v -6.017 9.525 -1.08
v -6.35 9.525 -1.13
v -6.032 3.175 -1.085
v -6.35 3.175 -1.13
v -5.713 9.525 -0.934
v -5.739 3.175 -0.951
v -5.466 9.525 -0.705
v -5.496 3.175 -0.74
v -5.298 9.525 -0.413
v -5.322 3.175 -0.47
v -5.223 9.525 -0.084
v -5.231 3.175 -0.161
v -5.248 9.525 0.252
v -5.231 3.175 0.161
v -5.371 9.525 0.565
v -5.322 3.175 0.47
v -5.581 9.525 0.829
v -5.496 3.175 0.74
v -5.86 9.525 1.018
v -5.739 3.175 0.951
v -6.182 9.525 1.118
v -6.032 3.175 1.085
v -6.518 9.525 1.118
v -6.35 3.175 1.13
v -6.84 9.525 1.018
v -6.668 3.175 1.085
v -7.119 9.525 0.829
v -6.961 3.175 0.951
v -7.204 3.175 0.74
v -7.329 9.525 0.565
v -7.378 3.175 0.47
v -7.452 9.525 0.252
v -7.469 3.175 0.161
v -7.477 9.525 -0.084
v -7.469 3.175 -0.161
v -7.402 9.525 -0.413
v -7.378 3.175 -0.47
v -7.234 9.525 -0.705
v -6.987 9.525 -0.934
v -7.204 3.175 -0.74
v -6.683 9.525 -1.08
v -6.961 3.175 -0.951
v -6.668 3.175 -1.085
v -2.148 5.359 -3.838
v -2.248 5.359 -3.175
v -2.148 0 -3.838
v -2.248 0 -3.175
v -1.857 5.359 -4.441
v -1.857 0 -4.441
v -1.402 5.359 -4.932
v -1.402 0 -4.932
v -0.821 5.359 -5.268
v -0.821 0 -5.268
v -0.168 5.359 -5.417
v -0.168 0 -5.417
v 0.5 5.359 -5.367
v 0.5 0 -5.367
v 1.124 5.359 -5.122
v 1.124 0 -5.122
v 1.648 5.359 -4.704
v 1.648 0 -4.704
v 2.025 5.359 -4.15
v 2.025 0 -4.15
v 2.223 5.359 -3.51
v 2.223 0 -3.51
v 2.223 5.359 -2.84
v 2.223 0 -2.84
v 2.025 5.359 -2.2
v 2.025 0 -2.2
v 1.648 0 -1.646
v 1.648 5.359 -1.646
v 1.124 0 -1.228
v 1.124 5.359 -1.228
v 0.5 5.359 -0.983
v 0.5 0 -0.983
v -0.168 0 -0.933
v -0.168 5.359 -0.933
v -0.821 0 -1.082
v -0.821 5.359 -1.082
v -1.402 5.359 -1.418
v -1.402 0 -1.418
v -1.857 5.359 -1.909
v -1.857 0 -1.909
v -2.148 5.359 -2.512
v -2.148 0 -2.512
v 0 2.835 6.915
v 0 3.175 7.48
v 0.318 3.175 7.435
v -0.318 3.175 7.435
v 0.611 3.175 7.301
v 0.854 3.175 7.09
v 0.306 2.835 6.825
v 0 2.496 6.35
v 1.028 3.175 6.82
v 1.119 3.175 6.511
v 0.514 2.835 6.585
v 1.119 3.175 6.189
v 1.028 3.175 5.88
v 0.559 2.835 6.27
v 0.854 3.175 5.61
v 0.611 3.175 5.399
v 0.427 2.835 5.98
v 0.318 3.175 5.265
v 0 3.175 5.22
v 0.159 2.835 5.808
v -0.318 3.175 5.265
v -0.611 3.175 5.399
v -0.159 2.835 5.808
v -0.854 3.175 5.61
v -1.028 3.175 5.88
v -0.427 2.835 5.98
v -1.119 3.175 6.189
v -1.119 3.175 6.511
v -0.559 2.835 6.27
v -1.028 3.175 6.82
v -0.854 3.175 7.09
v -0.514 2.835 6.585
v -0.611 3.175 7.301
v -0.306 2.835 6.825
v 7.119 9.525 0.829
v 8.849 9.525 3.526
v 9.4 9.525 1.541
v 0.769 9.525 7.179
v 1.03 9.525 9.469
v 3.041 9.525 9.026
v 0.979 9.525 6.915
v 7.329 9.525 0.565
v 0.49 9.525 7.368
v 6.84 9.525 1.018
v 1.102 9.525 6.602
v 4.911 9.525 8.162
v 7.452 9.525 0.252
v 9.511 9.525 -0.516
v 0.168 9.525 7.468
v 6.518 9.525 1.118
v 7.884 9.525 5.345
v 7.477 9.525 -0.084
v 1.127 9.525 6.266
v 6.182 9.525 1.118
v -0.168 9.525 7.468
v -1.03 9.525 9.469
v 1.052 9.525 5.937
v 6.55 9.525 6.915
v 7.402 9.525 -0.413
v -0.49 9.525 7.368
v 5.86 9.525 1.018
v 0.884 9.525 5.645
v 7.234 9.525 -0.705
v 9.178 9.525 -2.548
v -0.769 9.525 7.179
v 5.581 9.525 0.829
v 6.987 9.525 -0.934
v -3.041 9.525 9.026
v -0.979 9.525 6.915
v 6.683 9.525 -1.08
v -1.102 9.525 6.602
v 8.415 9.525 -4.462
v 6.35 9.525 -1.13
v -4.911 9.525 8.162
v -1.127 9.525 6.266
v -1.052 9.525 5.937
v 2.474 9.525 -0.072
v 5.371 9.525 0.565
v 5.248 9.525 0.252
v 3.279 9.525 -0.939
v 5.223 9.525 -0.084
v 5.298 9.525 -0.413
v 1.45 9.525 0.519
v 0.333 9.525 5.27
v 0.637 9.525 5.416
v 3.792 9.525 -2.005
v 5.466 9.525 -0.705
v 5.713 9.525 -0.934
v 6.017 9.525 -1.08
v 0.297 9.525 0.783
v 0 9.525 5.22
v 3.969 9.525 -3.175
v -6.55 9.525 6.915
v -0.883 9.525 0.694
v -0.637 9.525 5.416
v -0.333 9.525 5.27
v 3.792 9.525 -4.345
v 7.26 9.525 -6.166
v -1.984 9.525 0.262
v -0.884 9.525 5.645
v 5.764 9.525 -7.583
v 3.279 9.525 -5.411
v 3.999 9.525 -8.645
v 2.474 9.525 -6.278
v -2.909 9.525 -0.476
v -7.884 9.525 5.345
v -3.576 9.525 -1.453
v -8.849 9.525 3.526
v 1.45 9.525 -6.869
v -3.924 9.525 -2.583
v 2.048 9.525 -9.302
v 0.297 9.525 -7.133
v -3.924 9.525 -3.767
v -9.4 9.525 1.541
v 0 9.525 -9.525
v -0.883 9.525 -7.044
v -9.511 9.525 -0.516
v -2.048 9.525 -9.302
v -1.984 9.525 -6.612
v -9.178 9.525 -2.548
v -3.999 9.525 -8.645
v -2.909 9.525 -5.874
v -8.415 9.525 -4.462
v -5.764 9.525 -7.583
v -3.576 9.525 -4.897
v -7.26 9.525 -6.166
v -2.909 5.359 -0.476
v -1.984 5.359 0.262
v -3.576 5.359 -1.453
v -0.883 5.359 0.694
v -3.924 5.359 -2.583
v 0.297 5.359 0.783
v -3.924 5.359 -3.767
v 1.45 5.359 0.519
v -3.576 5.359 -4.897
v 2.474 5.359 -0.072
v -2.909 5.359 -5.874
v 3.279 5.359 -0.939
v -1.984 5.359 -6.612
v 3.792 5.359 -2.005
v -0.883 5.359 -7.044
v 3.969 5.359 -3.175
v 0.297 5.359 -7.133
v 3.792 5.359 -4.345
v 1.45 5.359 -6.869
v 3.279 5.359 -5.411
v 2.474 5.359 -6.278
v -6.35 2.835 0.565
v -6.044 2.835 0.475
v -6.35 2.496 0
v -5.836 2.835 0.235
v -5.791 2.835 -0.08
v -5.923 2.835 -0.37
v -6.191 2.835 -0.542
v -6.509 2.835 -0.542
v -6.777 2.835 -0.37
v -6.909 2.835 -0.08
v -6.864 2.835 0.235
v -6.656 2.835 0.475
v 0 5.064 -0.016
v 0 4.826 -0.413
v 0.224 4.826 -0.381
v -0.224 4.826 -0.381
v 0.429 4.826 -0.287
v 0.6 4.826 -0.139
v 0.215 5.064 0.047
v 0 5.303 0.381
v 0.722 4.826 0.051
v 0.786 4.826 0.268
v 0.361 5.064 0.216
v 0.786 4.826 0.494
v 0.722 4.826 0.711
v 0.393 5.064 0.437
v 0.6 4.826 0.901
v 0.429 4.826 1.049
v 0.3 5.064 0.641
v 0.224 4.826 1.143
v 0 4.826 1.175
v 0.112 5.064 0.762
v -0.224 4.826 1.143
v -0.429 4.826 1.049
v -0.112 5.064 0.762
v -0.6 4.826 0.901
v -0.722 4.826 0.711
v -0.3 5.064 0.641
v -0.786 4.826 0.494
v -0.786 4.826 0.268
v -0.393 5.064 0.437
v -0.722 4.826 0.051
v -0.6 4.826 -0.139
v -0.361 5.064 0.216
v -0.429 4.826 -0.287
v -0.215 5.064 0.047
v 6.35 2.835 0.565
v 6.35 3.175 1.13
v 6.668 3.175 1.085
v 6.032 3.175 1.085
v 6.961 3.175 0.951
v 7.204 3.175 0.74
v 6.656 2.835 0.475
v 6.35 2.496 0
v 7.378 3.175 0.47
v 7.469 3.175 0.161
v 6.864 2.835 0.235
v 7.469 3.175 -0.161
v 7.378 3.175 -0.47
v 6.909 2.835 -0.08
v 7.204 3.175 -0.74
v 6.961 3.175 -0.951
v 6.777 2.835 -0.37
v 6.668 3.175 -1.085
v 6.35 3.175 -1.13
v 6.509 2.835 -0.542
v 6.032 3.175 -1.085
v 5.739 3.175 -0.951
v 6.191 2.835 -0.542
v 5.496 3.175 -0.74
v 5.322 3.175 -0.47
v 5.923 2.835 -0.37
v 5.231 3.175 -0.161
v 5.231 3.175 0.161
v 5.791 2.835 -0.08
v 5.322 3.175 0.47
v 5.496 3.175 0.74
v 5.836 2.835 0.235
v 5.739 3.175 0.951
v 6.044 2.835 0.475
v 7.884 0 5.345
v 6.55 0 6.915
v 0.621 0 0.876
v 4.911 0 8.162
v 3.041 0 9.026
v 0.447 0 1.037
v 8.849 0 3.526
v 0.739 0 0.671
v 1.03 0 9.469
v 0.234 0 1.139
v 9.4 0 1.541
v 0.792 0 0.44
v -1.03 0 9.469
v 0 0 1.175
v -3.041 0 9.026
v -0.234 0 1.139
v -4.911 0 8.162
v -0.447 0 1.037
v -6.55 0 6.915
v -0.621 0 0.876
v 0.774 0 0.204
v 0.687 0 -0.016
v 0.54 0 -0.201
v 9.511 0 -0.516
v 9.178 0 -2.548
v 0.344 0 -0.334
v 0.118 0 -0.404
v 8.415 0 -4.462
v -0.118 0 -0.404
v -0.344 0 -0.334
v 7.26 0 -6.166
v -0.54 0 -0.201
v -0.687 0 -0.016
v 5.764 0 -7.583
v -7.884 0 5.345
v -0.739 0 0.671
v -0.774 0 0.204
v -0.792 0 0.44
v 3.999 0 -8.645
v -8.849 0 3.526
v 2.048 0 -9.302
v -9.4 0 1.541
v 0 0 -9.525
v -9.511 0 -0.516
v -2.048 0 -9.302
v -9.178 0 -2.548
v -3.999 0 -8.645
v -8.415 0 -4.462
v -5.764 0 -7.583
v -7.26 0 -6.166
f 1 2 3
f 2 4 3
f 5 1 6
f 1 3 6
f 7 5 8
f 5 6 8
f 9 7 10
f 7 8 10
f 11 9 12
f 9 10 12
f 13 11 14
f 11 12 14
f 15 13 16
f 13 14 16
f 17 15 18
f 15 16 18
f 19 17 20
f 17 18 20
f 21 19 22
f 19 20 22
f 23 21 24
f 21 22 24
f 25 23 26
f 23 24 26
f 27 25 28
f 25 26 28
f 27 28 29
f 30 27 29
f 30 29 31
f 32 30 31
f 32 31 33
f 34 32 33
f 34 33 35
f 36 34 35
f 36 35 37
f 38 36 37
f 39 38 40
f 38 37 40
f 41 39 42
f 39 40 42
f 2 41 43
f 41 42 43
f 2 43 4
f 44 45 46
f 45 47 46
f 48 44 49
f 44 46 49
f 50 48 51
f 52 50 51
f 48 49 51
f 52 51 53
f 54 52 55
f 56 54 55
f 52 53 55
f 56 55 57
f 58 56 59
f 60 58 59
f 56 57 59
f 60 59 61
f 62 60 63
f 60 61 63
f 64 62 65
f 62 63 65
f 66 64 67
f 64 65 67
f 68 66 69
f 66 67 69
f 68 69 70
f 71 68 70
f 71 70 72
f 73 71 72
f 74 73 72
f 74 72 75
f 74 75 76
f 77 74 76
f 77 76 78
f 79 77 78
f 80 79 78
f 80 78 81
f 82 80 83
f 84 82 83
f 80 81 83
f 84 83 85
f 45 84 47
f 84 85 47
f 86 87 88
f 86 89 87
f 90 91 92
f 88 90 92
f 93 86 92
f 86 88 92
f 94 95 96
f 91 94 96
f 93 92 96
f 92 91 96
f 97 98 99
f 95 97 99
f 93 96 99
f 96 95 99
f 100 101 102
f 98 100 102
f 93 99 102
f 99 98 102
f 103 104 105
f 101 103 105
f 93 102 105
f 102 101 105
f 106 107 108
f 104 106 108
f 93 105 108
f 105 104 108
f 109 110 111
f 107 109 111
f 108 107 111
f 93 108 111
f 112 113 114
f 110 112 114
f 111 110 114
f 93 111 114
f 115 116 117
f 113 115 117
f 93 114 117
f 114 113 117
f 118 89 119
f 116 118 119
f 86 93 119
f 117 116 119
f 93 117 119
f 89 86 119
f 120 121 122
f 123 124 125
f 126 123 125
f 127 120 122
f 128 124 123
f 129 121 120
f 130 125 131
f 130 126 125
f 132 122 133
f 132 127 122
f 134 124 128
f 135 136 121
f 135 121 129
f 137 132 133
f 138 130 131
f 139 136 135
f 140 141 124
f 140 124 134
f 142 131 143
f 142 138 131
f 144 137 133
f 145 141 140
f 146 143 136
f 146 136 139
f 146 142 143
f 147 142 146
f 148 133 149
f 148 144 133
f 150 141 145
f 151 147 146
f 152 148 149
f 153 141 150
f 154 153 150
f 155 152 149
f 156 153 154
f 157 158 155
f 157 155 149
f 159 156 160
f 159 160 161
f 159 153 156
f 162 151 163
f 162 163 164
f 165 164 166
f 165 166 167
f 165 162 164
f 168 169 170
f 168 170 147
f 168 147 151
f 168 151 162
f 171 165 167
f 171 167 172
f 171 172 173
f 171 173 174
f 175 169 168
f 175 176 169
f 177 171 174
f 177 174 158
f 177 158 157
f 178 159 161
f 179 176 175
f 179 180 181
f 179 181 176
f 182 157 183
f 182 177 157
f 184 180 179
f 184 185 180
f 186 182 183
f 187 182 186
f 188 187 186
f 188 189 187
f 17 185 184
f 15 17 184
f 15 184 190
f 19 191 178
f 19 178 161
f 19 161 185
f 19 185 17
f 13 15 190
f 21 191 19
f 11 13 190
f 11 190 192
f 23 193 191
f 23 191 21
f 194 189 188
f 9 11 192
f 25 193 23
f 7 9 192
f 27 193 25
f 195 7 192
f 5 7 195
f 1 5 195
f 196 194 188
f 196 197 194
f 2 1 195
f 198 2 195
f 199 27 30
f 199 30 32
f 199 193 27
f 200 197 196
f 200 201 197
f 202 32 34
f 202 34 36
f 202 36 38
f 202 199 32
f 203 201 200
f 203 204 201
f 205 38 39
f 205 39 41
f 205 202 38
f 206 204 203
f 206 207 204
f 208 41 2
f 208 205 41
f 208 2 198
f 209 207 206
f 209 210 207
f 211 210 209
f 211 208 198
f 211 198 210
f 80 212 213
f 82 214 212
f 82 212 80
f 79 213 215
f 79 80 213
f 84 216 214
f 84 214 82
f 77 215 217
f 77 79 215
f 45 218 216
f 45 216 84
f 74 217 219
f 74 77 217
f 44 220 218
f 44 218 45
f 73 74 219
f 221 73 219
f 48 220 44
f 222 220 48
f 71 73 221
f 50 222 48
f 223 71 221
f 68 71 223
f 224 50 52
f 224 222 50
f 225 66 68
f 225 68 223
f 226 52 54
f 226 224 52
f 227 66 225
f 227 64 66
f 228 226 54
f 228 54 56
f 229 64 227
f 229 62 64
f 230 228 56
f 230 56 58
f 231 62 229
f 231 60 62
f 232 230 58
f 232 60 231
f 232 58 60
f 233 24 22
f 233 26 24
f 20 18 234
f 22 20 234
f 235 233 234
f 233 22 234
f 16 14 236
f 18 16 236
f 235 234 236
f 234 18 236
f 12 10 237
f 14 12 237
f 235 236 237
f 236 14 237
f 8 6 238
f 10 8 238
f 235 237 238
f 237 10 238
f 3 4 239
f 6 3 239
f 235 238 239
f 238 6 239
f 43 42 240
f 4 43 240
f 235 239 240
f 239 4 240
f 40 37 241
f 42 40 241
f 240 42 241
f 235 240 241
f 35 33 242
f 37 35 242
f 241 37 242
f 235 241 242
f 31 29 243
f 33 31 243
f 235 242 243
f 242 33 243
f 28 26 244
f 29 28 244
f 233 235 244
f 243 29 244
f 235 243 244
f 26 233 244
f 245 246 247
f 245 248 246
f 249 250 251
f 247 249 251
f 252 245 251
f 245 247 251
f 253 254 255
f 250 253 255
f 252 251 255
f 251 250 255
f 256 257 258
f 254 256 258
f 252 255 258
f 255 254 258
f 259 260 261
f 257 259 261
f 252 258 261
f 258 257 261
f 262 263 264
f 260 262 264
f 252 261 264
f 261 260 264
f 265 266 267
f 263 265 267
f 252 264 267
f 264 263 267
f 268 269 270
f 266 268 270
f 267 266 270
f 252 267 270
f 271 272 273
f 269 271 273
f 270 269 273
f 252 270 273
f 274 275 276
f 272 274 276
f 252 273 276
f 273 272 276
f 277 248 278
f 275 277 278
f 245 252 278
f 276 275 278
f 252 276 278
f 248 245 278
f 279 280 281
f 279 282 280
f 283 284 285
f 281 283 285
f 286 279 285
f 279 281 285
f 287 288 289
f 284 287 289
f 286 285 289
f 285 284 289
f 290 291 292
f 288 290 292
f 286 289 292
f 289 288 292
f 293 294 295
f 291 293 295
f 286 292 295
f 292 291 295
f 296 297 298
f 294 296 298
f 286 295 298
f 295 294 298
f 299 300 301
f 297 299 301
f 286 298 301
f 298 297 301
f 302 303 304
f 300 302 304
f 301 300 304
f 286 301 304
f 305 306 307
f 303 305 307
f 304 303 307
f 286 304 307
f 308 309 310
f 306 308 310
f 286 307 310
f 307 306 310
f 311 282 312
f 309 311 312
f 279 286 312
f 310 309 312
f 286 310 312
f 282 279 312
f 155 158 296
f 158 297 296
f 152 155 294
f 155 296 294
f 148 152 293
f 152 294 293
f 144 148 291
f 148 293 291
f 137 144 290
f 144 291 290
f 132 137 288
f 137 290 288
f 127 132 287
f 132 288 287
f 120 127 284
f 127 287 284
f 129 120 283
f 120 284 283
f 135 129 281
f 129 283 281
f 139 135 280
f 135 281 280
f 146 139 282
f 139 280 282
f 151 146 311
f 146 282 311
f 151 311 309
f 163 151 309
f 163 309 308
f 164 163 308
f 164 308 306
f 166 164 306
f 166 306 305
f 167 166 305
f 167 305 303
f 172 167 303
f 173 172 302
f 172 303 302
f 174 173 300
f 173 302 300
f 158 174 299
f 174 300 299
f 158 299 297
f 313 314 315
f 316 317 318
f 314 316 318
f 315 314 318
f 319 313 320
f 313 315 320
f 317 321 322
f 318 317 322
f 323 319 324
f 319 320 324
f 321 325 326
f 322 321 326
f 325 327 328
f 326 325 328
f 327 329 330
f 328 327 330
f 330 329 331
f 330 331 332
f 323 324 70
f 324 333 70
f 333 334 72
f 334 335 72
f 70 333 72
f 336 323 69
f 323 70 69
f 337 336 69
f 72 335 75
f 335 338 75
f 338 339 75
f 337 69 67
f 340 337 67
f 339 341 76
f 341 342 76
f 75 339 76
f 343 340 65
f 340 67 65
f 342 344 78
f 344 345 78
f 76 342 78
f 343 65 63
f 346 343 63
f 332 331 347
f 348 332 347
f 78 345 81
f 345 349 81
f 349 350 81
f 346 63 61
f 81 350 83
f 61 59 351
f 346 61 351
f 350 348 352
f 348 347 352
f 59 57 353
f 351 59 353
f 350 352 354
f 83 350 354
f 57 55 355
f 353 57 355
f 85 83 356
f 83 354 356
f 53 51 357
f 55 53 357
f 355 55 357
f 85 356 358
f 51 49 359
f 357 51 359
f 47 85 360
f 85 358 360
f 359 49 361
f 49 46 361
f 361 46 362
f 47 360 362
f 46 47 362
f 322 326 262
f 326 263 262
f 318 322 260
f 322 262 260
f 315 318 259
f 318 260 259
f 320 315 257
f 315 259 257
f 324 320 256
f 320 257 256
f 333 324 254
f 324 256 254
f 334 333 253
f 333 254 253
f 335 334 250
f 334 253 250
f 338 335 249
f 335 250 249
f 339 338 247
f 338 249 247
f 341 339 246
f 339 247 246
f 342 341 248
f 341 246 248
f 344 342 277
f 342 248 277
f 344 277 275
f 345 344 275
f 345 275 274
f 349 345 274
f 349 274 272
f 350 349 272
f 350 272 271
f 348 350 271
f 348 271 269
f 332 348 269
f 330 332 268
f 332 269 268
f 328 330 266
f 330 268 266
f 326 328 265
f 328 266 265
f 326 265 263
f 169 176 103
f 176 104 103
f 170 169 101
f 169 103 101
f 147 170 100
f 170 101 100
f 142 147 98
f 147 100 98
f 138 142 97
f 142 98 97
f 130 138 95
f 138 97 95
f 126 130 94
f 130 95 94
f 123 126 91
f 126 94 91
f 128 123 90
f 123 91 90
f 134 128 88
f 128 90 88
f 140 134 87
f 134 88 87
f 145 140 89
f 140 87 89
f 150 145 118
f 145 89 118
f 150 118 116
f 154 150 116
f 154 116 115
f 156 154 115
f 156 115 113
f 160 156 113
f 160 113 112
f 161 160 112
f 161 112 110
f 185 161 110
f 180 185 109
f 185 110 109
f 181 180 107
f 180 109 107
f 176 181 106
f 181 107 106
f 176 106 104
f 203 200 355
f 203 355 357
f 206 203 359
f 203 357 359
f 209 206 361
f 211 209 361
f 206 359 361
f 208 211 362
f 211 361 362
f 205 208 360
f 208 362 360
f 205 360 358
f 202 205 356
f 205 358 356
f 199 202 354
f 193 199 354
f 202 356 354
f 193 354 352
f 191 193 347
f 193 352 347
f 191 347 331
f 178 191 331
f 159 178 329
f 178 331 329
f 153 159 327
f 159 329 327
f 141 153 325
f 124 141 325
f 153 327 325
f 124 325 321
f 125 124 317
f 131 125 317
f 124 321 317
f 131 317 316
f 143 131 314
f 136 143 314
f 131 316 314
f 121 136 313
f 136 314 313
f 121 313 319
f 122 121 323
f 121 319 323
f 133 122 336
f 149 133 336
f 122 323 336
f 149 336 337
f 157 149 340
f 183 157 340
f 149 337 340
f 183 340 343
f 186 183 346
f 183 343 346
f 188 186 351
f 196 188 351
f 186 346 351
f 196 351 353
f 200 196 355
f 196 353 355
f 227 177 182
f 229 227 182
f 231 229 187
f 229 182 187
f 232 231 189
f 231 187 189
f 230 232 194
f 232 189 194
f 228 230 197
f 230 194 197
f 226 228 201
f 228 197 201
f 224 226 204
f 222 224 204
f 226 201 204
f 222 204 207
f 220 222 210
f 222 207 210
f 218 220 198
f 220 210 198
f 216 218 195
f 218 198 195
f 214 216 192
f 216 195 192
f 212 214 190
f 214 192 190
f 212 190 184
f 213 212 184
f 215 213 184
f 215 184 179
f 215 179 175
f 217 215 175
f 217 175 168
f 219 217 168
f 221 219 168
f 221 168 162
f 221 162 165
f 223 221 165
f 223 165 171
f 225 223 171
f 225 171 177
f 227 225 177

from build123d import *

# Parameters (mm, degrees)
SKETCH1_R                                      = 9.525
BOSS_EXTRUDE1_DEPTH                            = 9.525
CBORE_FOR_8_SOCKET_HEAD_CAP_SCREW1_D           = 4.4958
CBORE_FOR_8_SOCKET_HEAD_CAP_SCREW1_CBORE_D     = 7.9375
CBORE_FOR_8_SOCKET_HEAD_CAP_SCREW1_CBORE_DEPTH = 4.1656
F_1_16_0_0625_DIAMETER_HOLE1_D                 = 1.5875
F_1_16_0_0625_DIAMETER_HOLE1_DEPTH             = 4.826
F_1_16_0_0625_DIAMETER_HOLE1_TIP               = 0.476933116
F_4_40_TAPPED_HOLE1_D                          = 2.2606
F_4_40_TAPPED_HOLE1_DEPTH                      = 6.35
F_4_40_TAPPED_HOLE1_TIP                        = 0.679152758


with BuildPart() as part:
    # Sketch1 → Boss-Extrude1 (new body)
    with BuildSketch(Plane(origin=(0, 0, 0), x_dir=(1, 0, 0), z_dir=(0, 1, 0))):
        with Locations(Location((0, 0, 0), (0, 0, 90))):
            Circle(SKETCH1_R)
    extrude(amount=BOSS_EXTRUDE1_DEPTH)

    # CBORE for #8 Socket Head Cap Screw1 (through all)
    with Locations(Plane(origin=(0, 9.525, 0), x_dir=(1, 0, 0), z_dir=(0, 1, 0))):
        with Locations((0, 3.175)):
            CounterBoreHole(CBORE_FOR_8_SOCKET_HEAD_CAP_SCREW1_D / 2, CBORE_FOR_8_SOCKET_HEAD_CAP_SCREW1_CBORE_D / 2, CBORE_FOR_8_SOCKET_HEAD_CAP_SCREW1_CBORE_DEPTH)

    # 1/16 (0.0625) Diameter Hole1
    with Locations(Plane(origin=(0, 0, 0.381), x_dir=(0, 0, -1), z_dir=(0, -1, 0))):
        with Locations((0, 0)):
            Hole(F_1_16_0_0625_DIAMETER_HOLE1_D / 2, depth=F_1_16_0_0625_DIAMETER_HOLE1_DEPTH)
            with Locations((0, 0, -(F_1_16_0_0625_DIAMETER_HOLE1_DEPTH + F_1_16_0_0625_DIAMETER_HOLE1_TIP / 2))):  # 118° drill point
                Cone(0, F_1_16_0_0625_DIAMETER_HOLE1_D / 2, F_1_16_0_0625_DIAMETER_HOLE1_TIP, mode=Mode.SUBTRACT)

    # #4-40 Tapped Hole1
    with Locations(Plane(origin=(-6.35, 9.525, 0), x_dir=(0, 0, 1), z_dir=(0, 1, 0))):
        with Locations((0, 0), (0, 12.7), (6.35, 6.35)):
            Hole(F_4_40_TAPPED_HOLE1_D / 2, depth=F_4_40_TAPPED_HOLE1_DEPTH)
            with Locations((0, 0, -(F_4_40_TAPPED_HOLE1_DEPTH + F_4_40_TAPPED_HOLE1_TIP / 2))):  # 118° drill point
                Cone(0, F_4_40_TAPPED_HOLE1_D / 2, F_4_40_TAPPED_HOLE1_TIP, mode=Mode.SUBTRACT)


solid = part.part
